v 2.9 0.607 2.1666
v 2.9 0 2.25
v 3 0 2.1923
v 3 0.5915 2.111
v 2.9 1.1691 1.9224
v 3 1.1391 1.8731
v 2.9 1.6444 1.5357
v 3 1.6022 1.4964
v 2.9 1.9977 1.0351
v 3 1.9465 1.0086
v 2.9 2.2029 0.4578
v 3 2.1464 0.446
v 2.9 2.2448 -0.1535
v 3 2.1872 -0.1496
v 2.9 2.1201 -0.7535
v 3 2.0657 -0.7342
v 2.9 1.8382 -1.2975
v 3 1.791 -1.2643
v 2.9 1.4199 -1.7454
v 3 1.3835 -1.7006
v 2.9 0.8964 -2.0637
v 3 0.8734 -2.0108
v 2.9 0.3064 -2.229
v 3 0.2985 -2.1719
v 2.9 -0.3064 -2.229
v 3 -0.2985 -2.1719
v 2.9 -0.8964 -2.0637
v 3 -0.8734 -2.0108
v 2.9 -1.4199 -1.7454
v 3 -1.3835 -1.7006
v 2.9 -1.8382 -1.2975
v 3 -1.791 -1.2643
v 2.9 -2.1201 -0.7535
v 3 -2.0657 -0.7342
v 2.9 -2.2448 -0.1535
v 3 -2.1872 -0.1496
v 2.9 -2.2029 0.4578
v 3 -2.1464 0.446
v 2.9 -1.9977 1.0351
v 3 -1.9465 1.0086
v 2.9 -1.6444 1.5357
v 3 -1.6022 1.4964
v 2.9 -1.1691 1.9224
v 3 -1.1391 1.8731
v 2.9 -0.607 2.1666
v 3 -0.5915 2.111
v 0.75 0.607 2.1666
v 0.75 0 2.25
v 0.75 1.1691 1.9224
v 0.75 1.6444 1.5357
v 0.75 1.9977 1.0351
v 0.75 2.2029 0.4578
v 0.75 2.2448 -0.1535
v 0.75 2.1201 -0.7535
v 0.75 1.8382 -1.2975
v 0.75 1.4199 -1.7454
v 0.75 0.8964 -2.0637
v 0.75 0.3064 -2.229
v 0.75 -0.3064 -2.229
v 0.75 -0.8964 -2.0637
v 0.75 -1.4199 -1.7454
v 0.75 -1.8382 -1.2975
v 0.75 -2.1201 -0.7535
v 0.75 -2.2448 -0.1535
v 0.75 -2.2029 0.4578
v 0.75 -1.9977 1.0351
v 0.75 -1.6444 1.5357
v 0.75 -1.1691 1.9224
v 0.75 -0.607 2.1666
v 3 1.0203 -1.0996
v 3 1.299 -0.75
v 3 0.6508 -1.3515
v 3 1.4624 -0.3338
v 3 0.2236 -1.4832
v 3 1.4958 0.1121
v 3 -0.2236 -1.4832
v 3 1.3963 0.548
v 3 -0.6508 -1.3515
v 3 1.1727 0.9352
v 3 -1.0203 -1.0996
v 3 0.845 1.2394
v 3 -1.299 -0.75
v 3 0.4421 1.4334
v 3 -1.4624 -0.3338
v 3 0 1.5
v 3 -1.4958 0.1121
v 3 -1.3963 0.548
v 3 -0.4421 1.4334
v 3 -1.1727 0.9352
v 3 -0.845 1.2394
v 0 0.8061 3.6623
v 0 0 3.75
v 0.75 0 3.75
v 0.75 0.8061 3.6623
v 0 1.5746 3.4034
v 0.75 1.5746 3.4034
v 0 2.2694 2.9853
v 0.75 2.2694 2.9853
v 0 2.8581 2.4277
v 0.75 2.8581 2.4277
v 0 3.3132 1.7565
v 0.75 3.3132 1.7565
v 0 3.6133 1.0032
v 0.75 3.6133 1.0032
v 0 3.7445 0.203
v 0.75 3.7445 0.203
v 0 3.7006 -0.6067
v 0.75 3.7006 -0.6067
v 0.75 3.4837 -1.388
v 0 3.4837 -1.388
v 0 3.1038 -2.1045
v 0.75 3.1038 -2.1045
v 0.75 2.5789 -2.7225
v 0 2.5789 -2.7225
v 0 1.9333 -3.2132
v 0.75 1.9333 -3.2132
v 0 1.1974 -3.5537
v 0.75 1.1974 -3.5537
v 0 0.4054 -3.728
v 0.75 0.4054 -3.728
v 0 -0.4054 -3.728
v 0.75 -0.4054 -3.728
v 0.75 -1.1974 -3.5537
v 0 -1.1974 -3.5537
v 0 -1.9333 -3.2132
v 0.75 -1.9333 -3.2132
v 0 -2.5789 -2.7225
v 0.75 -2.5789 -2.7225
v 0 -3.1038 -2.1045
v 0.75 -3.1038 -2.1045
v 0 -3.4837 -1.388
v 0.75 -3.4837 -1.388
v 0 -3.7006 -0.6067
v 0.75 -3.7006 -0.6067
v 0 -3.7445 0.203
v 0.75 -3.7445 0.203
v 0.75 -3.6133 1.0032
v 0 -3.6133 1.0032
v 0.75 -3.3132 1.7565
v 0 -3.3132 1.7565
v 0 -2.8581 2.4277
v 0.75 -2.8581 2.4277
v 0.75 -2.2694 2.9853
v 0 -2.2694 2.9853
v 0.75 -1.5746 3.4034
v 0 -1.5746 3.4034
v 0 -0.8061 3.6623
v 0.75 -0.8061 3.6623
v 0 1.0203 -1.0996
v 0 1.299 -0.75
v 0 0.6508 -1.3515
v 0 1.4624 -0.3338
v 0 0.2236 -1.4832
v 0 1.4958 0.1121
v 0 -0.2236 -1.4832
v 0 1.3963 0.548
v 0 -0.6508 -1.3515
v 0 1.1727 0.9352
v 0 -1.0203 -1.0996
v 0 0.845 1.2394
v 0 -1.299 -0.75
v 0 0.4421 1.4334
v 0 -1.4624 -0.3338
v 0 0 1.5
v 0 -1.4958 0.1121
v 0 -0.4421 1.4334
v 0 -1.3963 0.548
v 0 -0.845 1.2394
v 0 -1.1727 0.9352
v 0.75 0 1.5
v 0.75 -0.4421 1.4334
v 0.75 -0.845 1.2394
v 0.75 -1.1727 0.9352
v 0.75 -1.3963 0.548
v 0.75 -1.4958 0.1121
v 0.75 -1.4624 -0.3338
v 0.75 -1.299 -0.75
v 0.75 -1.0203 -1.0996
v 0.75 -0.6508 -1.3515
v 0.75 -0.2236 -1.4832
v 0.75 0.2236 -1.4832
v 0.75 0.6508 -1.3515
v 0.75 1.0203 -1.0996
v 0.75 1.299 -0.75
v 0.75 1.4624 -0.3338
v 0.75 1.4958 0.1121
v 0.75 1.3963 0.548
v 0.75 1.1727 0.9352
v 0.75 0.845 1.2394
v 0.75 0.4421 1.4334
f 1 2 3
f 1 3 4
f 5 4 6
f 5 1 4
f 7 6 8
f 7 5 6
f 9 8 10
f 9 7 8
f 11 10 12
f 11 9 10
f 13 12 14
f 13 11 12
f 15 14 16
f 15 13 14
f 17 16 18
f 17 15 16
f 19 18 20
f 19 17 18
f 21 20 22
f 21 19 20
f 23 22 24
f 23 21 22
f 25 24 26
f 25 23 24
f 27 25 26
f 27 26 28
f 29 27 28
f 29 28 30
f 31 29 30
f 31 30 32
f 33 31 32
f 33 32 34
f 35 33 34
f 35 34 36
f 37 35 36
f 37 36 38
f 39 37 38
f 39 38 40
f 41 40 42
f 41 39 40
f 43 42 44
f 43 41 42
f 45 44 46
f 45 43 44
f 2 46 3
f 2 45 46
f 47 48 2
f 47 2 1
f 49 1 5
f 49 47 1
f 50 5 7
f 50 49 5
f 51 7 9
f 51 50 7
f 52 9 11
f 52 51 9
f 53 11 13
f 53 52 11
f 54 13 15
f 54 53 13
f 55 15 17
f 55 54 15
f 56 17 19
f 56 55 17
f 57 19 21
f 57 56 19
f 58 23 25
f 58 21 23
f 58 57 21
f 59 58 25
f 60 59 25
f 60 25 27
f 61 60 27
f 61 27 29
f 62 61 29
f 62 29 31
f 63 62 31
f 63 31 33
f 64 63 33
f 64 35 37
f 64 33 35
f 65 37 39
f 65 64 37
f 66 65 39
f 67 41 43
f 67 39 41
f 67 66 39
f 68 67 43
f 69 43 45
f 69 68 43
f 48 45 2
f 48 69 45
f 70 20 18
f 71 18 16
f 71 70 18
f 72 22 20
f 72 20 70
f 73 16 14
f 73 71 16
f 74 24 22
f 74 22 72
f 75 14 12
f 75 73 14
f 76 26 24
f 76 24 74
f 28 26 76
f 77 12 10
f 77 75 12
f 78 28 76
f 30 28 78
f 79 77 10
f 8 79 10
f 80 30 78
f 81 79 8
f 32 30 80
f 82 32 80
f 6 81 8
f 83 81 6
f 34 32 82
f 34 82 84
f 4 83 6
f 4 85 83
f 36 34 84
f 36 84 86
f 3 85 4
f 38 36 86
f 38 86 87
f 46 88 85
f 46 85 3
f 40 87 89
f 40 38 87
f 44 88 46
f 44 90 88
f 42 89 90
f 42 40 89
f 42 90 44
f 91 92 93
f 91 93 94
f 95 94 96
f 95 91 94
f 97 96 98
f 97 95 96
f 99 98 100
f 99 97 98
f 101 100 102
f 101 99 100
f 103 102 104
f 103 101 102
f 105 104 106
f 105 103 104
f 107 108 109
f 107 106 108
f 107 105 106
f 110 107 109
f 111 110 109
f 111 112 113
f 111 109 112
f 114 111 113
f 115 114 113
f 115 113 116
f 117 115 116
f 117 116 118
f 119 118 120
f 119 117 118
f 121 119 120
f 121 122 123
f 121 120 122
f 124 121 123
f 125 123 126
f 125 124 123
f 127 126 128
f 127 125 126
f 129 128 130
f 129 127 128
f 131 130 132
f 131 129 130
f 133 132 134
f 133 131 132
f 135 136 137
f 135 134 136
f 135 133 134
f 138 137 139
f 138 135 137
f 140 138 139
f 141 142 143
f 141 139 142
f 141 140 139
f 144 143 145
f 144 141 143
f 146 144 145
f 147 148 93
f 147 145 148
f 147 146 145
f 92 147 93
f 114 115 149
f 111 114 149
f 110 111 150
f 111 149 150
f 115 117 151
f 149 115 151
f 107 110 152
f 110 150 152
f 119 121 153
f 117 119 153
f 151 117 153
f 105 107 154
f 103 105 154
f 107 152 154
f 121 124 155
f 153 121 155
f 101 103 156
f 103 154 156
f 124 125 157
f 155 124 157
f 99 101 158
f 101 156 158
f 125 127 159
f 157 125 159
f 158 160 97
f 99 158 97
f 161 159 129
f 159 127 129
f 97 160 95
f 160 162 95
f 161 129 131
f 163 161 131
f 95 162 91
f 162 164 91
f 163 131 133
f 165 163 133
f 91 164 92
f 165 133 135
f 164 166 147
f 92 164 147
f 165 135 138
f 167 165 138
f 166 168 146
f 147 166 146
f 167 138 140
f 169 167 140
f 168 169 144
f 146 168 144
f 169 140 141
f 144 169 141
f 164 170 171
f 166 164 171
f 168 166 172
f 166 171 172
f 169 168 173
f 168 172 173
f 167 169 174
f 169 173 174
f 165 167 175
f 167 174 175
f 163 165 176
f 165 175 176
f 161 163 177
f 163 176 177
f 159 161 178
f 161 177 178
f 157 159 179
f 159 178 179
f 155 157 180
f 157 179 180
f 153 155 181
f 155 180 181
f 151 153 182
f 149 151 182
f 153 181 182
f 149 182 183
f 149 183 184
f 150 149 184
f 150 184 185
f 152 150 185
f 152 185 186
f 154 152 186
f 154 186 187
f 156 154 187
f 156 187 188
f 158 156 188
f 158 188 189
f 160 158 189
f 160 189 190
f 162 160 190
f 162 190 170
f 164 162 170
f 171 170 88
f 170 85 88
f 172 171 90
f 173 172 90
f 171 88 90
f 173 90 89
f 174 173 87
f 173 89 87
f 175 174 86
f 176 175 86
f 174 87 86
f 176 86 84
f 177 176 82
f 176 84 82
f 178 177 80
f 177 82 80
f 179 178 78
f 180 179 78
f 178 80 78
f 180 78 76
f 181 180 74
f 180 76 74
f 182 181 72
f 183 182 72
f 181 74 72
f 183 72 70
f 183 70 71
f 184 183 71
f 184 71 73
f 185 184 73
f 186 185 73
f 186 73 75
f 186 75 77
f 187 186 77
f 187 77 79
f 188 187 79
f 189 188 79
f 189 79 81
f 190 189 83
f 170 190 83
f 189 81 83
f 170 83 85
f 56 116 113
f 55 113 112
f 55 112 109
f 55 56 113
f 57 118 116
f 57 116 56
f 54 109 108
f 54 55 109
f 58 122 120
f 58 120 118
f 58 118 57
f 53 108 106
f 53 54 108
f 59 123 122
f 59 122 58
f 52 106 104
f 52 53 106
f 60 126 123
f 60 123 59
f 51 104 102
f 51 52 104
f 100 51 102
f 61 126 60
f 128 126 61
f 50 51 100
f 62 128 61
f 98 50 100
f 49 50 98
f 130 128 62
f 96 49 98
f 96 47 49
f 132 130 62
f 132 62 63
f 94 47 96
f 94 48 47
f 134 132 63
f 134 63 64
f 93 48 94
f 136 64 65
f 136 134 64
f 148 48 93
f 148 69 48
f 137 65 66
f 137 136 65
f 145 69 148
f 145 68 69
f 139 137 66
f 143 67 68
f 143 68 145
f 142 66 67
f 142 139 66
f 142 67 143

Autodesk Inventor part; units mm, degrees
ref_plane "YZ Plane" through (0, 0, 0) normal (1, 0, 0) x (0, 1, 0)
ref_plane "XZ Plane" through (0, 0, 0) normal (0, 1, 0) x (-1, 0, 0)
ref_plane "XY Plane" through (0, 0, 0) normal (0, 0, 1) x (1, 0, 0)
sketch "スケッチ2" plane through (0, 0, 0) normal (0, 1, 0) x (-1, 0, 0)
  line L0 (0, 1.5) -> (-0.75, 1.5)
  line L1 (-0.75, 2.25) -> (-0.75, 3.75)
  line L2 (-0.75, 3.75) -> (0, 3.75)
  line L3 (0, 3.75) -> (0, 1.5)
  line L4 (-0.75, 1.5) -> (-3, 1.5)
  line L5 (-3, 1.5) -> (-3, 2.1923)
  line L6 (0, 0) -> (-4.3872, 0)
  line L7 (-3, 2.1923) -> (-2.9, 2.25)
  line L8 (-2.9, 2.25) -> (-0.75, 2.25)
  dimension "d0" = 3.75
  dimension "d2" = 1.5
  dimension "d3" = 0.75
  dimension "d4" = 3
  dimension "d5" = 30
  dimension "d6" = 2.25
  dimension "d7" = 0.1
  dimension "d8" = 0
revolve "回転1" add sketch "スケッチ2" angle 360 about axis through (0, 0, 0) along (1, 0, 0)
properties part number "GFM-0304-03" material "PAEK 樹脂"
